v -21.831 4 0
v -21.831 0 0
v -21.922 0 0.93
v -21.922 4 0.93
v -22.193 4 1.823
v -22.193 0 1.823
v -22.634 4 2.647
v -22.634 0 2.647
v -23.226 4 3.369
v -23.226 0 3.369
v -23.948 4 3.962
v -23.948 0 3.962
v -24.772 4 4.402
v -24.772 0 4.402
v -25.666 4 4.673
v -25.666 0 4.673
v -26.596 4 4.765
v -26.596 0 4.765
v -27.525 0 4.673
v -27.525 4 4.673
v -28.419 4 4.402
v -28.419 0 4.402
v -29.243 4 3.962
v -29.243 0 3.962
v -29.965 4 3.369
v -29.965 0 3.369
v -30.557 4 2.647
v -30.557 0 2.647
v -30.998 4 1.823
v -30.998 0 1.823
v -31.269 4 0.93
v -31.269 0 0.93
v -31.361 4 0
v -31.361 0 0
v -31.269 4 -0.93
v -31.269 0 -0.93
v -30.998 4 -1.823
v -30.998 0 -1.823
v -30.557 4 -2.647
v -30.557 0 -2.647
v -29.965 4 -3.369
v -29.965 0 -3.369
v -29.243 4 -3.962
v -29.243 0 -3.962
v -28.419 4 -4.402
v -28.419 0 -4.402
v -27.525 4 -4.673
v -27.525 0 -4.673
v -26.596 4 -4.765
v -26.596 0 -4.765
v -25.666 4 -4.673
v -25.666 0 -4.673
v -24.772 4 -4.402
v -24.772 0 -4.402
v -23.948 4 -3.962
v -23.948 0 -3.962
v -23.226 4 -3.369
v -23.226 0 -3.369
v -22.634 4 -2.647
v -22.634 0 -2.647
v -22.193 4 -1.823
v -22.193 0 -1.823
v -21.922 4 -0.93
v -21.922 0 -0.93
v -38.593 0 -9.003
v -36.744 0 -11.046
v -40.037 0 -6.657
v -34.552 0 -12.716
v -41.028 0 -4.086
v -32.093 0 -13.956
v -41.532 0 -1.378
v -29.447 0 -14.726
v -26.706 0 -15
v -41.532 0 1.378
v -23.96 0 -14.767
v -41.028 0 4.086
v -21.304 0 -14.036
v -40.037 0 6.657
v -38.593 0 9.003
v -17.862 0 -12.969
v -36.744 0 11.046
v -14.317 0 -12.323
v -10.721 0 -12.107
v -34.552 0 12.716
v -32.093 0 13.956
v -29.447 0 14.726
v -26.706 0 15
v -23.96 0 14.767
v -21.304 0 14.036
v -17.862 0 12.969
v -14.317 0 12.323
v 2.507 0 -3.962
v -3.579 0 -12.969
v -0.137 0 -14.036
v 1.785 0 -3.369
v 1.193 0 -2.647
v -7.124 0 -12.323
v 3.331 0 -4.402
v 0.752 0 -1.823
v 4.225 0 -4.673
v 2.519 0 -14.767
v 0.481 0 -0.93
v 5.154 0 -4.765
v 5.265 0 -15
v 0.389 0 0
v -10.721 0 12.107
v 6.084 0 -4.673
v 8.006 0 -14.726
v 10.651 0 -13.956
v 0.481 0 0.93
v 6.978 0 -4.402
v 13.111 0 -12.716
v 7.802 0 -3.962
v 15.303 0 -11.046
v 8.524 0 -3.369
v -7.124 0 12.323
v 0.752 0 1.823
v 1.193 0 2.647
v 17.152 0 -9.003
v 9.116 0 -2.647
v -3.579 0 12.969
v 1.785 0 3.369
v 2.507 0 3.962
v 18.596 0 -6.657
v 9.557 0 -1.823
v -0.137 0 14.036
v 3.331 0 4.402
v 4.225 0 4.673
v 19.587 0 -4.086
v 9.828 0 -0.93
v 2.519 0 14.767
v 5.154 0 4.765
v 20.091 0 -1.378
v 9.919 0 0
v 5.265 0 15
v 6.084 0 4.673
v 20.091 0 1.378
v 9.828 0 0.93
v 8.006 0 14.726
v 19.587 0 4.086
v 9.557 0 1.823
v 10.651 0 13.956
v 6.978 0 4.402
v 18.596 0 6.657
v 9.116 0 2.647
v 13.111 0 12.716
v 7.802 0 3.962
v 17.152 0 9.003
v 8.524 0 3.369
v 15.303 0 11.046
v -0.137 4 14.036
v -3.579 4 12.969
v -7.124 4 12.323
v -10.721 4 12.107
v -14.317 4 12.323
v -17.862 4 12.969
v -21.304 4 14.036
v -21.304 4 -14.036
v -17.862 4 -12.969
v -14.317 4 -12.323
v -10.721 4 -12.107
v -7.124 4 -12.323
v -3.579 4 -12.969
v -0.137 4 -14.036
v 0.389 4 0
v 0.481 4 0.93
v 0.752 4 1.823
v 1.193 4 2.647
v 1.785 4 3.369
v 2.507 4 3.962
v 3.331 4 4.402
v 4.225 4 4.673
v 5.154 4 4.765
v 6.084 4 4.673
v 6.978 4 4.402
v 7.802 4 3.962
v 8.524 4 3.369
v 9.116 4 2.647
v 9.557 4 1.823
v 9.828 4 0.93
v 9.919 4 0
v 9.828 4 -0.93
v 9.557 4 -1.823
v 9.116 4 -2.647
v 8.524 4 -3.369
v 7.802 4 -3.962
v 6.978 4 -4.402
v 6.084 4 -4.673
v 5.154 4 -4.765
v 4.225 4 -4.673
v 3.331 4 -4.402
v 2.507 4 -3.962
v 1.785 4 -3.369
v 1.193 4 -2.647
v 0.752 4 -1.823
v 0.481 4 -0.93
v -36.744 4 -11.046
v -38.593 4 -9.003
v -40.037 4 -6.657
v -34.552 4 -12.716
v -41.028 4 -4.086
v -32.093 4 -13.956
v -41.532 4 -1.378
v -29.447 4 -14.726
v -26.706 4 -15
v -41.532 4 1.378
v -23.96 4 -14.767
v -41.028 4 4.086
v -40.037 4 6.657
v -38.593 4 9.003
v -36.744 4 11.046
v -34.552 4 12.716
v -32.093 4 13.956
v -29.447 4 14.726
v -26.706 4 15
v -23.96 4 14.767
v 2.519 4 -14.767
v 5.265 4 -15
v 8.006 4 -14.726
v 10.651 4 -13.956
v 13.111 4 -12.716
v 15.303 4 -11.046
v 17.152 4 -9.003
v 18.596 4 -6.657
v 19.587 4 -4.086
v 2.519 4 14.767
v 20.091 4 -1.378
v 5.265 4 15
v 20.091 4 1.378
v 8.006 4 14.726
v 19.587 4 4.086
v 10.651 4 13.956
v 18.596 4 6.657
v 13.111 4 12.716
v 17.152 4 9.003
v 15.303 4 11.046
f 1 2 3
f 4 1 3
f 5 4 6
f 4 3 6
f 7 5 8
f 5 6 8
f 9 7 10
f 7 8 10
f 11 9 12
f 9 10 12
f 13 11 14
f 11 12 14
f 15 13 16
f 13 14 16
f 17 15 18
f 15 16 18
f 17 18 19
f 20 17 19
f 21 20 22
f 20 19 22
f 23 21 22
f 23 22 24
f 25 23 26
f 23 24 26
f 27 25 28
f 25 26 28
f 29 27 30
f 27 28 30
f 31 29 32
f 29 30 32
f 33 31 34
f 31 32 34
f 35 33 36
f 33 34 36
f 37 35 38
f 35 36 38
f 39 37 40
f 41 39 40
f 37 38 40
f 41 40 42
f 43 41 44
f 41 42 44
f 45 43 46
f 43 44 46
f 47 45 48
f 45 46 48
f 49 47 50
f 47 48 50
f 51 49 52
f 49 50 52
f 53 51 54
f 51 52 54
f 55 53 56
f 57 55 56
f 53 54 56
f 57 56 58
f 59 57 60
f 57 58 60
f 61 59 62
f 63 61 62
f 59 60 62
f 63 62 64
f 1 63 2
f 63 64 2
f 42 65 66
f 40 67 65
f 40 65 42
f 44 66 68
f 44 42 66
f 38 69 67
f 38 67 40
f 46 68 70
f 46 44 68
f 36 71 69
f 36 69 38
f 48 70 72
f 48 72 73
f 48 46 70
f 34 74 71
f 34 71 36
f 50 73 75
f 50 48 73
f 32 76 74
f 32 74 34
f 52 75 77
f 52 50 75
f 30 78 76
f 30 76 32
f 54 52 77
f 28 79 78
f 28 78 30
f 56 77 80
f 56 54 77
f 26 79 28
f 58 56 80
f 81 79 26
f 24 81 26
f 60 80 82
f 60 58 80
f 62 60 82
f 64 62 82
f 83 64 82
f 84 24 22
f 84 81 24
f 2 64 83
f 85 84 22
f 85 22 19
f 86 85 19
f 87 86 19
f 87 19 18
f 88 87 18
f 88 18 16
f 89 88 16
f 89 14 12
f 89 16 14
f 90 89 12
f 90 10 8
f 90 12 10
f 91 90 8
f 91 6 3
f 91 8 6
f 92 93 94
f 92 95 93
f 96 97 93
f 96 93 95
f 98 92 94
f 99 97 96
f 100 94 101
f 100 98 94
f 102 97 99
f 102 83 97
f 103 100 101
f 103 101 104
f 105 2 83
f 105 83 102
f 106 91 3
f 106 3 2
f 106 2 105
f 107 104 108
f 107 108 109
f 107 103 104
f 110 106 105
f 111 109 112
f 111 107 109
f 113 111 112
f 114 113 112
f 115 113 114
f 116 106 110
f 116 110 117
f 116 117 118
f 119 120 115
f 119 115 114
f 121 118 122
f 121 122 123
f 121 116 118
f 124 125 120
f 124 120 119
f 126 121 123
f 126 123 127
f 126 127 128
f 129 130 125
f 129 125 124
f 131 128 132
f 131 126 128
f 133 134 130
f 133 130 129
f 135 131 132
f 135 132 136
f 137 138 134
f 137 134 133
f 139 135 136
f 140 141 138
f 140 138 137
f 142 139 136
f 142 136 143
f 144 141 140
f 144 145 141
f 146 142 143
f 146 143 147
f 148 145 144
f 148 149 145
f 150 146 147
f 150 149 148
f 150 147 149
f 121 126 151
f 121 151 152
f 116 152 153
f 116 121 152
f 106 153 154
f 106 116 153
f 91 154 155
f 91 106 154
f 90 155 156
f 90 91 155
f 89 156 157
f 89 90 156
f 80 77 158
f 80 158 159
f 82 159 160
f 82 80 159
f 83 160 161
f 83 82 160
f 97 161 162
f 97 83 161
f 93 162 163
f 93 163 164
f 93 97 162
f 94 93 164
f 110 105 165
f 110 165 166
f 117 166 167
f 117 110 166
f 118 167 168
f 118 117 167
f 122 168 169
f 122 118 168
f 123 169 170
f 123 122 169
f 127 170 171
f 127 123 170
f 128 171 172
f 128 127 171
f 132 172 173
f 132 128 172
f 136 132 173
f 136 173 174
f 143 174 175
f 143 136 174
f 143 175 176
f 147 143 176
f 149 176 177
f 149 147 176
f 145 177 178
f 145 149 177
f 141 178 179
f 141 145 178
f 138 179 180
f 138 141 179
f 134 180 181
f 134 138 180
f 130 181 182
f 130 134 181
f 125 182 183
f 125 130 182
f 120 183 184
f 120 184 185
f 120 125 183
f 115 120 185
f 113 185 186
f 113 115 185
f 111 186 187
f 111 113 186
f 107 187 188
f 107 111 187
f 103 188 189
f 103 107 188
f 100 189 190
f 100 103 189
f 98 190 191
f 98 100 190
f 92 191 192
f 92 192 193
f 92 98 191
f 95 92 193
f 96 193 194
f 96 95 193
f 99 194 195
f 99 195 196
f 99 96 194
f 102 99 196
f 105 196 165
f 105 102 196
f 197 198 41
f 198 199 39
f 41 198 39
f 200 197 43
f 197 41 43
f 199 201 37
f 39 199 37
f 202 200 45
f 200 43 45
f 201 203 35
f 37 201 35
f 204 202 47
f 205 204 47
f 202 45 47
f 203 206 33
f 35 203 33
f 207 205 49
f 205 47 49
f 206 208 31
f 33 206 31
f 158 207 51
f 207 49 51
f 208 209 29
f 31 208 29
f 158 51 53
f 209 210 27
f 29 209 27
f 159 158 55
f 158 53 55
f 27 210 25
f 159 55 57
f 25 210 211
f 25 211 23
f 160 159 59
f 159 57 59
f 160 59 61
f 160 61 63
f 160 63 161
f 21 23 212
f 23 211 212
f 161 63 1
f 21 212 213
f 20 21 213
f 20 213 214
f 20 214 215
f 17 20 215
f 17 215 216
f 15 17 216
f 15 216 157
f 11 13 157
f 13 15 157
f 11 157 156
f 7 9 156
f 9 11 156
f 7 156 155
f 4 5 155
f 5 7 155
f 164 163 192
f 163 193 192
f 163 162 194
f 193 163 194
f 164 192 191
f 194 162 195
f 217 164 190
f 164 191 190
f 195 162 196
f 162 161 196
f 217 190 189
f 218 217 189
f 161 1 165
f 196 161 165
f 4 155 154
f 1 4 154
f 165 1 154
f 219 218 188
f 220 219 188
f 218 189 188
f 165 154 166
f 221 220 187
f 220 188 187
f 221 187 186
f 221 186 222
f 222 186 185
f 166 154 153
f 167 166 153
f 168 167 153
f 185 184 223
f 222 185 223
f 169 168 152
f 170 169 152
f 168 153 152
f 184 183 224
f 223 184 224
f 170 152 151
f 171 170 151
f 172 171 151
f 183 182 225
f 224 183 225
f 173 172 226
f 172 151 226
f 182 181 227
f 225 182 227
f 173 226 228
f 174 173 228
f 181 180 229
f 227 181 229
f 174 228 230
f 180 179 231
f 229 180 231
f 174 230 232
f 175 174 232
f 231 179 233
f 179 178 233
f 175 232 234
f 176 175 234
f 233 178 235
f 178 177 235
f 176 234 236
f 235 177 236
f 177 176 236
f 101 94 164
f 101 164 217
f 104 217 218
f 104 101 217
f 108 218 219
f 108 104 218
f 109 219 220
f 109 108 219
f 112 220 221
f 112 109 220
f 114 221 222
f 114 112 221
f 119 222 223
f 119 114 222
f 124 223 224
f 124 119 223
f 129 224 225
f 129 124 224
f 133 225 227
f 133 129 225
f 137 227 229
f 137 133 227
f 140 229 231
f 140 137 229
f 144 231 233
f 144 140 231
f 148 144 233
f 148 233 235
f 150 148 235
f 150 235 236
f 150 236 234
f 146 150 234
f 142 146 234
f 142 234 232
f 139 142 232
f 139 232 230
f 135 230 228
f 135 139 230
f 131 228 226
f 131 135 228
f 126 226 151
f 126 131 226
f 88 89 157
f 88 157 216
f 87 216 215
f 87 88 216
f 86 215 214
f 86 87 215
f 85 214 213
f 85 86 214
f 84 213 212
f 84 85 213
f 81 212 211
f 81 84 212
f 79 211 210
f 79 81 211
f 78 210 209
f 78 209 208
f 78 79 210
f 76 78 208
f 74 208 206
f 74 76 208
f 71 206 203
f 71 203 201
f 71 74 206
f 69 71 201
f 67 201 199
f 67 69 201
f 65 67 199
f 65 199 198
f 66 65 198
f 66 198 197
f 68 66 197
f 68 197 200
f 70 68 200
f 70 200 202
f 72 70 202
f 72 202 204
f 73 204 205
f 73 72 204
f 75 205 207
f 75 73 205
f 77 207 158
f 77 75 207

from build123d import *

# Parameters (mm, degrees)
F0_R     = 4.765
F1_DEPTH = 4


with BuildPart() as f1:
    # F0 (on Front) → F1 (new body)
    with BuildSketch(Plane.XZ):
        with BuildLine():
            ThreePointArc((-0.13718, 14.035607), (-10.720514, 12.106821), (-21.303847, 14.035607))
            ThreePointArc((-21.303847, 14.035607), (-41.595514, 0), (-21.303847, -14.035607))
            ThreePointArc((-21.303847, -14.035607), (-10.720514, -12.106821), (-0.13718, -14.035607))
            ThreePointArc((-0.13718, -14.035607), (20.154486, 0), (-0.13718, 14.035607))
        make_face()
        with Locations((-26.595514, 0)):
            Circle(F0_R, mode=Mode.SUBTRACT)
        with BuildLine():
            ThreePointArc((9.919486, 0), (5.154486, -4.765), (0.389486, 0))
            ThreePointArc((0.389486, 0), (5.154486, 4.765), (9.919486, 0))
        make_face(mode=Mode.SUBTRACT)
    extrude(amount=-F1_DEPTH)


solid = f1.part
